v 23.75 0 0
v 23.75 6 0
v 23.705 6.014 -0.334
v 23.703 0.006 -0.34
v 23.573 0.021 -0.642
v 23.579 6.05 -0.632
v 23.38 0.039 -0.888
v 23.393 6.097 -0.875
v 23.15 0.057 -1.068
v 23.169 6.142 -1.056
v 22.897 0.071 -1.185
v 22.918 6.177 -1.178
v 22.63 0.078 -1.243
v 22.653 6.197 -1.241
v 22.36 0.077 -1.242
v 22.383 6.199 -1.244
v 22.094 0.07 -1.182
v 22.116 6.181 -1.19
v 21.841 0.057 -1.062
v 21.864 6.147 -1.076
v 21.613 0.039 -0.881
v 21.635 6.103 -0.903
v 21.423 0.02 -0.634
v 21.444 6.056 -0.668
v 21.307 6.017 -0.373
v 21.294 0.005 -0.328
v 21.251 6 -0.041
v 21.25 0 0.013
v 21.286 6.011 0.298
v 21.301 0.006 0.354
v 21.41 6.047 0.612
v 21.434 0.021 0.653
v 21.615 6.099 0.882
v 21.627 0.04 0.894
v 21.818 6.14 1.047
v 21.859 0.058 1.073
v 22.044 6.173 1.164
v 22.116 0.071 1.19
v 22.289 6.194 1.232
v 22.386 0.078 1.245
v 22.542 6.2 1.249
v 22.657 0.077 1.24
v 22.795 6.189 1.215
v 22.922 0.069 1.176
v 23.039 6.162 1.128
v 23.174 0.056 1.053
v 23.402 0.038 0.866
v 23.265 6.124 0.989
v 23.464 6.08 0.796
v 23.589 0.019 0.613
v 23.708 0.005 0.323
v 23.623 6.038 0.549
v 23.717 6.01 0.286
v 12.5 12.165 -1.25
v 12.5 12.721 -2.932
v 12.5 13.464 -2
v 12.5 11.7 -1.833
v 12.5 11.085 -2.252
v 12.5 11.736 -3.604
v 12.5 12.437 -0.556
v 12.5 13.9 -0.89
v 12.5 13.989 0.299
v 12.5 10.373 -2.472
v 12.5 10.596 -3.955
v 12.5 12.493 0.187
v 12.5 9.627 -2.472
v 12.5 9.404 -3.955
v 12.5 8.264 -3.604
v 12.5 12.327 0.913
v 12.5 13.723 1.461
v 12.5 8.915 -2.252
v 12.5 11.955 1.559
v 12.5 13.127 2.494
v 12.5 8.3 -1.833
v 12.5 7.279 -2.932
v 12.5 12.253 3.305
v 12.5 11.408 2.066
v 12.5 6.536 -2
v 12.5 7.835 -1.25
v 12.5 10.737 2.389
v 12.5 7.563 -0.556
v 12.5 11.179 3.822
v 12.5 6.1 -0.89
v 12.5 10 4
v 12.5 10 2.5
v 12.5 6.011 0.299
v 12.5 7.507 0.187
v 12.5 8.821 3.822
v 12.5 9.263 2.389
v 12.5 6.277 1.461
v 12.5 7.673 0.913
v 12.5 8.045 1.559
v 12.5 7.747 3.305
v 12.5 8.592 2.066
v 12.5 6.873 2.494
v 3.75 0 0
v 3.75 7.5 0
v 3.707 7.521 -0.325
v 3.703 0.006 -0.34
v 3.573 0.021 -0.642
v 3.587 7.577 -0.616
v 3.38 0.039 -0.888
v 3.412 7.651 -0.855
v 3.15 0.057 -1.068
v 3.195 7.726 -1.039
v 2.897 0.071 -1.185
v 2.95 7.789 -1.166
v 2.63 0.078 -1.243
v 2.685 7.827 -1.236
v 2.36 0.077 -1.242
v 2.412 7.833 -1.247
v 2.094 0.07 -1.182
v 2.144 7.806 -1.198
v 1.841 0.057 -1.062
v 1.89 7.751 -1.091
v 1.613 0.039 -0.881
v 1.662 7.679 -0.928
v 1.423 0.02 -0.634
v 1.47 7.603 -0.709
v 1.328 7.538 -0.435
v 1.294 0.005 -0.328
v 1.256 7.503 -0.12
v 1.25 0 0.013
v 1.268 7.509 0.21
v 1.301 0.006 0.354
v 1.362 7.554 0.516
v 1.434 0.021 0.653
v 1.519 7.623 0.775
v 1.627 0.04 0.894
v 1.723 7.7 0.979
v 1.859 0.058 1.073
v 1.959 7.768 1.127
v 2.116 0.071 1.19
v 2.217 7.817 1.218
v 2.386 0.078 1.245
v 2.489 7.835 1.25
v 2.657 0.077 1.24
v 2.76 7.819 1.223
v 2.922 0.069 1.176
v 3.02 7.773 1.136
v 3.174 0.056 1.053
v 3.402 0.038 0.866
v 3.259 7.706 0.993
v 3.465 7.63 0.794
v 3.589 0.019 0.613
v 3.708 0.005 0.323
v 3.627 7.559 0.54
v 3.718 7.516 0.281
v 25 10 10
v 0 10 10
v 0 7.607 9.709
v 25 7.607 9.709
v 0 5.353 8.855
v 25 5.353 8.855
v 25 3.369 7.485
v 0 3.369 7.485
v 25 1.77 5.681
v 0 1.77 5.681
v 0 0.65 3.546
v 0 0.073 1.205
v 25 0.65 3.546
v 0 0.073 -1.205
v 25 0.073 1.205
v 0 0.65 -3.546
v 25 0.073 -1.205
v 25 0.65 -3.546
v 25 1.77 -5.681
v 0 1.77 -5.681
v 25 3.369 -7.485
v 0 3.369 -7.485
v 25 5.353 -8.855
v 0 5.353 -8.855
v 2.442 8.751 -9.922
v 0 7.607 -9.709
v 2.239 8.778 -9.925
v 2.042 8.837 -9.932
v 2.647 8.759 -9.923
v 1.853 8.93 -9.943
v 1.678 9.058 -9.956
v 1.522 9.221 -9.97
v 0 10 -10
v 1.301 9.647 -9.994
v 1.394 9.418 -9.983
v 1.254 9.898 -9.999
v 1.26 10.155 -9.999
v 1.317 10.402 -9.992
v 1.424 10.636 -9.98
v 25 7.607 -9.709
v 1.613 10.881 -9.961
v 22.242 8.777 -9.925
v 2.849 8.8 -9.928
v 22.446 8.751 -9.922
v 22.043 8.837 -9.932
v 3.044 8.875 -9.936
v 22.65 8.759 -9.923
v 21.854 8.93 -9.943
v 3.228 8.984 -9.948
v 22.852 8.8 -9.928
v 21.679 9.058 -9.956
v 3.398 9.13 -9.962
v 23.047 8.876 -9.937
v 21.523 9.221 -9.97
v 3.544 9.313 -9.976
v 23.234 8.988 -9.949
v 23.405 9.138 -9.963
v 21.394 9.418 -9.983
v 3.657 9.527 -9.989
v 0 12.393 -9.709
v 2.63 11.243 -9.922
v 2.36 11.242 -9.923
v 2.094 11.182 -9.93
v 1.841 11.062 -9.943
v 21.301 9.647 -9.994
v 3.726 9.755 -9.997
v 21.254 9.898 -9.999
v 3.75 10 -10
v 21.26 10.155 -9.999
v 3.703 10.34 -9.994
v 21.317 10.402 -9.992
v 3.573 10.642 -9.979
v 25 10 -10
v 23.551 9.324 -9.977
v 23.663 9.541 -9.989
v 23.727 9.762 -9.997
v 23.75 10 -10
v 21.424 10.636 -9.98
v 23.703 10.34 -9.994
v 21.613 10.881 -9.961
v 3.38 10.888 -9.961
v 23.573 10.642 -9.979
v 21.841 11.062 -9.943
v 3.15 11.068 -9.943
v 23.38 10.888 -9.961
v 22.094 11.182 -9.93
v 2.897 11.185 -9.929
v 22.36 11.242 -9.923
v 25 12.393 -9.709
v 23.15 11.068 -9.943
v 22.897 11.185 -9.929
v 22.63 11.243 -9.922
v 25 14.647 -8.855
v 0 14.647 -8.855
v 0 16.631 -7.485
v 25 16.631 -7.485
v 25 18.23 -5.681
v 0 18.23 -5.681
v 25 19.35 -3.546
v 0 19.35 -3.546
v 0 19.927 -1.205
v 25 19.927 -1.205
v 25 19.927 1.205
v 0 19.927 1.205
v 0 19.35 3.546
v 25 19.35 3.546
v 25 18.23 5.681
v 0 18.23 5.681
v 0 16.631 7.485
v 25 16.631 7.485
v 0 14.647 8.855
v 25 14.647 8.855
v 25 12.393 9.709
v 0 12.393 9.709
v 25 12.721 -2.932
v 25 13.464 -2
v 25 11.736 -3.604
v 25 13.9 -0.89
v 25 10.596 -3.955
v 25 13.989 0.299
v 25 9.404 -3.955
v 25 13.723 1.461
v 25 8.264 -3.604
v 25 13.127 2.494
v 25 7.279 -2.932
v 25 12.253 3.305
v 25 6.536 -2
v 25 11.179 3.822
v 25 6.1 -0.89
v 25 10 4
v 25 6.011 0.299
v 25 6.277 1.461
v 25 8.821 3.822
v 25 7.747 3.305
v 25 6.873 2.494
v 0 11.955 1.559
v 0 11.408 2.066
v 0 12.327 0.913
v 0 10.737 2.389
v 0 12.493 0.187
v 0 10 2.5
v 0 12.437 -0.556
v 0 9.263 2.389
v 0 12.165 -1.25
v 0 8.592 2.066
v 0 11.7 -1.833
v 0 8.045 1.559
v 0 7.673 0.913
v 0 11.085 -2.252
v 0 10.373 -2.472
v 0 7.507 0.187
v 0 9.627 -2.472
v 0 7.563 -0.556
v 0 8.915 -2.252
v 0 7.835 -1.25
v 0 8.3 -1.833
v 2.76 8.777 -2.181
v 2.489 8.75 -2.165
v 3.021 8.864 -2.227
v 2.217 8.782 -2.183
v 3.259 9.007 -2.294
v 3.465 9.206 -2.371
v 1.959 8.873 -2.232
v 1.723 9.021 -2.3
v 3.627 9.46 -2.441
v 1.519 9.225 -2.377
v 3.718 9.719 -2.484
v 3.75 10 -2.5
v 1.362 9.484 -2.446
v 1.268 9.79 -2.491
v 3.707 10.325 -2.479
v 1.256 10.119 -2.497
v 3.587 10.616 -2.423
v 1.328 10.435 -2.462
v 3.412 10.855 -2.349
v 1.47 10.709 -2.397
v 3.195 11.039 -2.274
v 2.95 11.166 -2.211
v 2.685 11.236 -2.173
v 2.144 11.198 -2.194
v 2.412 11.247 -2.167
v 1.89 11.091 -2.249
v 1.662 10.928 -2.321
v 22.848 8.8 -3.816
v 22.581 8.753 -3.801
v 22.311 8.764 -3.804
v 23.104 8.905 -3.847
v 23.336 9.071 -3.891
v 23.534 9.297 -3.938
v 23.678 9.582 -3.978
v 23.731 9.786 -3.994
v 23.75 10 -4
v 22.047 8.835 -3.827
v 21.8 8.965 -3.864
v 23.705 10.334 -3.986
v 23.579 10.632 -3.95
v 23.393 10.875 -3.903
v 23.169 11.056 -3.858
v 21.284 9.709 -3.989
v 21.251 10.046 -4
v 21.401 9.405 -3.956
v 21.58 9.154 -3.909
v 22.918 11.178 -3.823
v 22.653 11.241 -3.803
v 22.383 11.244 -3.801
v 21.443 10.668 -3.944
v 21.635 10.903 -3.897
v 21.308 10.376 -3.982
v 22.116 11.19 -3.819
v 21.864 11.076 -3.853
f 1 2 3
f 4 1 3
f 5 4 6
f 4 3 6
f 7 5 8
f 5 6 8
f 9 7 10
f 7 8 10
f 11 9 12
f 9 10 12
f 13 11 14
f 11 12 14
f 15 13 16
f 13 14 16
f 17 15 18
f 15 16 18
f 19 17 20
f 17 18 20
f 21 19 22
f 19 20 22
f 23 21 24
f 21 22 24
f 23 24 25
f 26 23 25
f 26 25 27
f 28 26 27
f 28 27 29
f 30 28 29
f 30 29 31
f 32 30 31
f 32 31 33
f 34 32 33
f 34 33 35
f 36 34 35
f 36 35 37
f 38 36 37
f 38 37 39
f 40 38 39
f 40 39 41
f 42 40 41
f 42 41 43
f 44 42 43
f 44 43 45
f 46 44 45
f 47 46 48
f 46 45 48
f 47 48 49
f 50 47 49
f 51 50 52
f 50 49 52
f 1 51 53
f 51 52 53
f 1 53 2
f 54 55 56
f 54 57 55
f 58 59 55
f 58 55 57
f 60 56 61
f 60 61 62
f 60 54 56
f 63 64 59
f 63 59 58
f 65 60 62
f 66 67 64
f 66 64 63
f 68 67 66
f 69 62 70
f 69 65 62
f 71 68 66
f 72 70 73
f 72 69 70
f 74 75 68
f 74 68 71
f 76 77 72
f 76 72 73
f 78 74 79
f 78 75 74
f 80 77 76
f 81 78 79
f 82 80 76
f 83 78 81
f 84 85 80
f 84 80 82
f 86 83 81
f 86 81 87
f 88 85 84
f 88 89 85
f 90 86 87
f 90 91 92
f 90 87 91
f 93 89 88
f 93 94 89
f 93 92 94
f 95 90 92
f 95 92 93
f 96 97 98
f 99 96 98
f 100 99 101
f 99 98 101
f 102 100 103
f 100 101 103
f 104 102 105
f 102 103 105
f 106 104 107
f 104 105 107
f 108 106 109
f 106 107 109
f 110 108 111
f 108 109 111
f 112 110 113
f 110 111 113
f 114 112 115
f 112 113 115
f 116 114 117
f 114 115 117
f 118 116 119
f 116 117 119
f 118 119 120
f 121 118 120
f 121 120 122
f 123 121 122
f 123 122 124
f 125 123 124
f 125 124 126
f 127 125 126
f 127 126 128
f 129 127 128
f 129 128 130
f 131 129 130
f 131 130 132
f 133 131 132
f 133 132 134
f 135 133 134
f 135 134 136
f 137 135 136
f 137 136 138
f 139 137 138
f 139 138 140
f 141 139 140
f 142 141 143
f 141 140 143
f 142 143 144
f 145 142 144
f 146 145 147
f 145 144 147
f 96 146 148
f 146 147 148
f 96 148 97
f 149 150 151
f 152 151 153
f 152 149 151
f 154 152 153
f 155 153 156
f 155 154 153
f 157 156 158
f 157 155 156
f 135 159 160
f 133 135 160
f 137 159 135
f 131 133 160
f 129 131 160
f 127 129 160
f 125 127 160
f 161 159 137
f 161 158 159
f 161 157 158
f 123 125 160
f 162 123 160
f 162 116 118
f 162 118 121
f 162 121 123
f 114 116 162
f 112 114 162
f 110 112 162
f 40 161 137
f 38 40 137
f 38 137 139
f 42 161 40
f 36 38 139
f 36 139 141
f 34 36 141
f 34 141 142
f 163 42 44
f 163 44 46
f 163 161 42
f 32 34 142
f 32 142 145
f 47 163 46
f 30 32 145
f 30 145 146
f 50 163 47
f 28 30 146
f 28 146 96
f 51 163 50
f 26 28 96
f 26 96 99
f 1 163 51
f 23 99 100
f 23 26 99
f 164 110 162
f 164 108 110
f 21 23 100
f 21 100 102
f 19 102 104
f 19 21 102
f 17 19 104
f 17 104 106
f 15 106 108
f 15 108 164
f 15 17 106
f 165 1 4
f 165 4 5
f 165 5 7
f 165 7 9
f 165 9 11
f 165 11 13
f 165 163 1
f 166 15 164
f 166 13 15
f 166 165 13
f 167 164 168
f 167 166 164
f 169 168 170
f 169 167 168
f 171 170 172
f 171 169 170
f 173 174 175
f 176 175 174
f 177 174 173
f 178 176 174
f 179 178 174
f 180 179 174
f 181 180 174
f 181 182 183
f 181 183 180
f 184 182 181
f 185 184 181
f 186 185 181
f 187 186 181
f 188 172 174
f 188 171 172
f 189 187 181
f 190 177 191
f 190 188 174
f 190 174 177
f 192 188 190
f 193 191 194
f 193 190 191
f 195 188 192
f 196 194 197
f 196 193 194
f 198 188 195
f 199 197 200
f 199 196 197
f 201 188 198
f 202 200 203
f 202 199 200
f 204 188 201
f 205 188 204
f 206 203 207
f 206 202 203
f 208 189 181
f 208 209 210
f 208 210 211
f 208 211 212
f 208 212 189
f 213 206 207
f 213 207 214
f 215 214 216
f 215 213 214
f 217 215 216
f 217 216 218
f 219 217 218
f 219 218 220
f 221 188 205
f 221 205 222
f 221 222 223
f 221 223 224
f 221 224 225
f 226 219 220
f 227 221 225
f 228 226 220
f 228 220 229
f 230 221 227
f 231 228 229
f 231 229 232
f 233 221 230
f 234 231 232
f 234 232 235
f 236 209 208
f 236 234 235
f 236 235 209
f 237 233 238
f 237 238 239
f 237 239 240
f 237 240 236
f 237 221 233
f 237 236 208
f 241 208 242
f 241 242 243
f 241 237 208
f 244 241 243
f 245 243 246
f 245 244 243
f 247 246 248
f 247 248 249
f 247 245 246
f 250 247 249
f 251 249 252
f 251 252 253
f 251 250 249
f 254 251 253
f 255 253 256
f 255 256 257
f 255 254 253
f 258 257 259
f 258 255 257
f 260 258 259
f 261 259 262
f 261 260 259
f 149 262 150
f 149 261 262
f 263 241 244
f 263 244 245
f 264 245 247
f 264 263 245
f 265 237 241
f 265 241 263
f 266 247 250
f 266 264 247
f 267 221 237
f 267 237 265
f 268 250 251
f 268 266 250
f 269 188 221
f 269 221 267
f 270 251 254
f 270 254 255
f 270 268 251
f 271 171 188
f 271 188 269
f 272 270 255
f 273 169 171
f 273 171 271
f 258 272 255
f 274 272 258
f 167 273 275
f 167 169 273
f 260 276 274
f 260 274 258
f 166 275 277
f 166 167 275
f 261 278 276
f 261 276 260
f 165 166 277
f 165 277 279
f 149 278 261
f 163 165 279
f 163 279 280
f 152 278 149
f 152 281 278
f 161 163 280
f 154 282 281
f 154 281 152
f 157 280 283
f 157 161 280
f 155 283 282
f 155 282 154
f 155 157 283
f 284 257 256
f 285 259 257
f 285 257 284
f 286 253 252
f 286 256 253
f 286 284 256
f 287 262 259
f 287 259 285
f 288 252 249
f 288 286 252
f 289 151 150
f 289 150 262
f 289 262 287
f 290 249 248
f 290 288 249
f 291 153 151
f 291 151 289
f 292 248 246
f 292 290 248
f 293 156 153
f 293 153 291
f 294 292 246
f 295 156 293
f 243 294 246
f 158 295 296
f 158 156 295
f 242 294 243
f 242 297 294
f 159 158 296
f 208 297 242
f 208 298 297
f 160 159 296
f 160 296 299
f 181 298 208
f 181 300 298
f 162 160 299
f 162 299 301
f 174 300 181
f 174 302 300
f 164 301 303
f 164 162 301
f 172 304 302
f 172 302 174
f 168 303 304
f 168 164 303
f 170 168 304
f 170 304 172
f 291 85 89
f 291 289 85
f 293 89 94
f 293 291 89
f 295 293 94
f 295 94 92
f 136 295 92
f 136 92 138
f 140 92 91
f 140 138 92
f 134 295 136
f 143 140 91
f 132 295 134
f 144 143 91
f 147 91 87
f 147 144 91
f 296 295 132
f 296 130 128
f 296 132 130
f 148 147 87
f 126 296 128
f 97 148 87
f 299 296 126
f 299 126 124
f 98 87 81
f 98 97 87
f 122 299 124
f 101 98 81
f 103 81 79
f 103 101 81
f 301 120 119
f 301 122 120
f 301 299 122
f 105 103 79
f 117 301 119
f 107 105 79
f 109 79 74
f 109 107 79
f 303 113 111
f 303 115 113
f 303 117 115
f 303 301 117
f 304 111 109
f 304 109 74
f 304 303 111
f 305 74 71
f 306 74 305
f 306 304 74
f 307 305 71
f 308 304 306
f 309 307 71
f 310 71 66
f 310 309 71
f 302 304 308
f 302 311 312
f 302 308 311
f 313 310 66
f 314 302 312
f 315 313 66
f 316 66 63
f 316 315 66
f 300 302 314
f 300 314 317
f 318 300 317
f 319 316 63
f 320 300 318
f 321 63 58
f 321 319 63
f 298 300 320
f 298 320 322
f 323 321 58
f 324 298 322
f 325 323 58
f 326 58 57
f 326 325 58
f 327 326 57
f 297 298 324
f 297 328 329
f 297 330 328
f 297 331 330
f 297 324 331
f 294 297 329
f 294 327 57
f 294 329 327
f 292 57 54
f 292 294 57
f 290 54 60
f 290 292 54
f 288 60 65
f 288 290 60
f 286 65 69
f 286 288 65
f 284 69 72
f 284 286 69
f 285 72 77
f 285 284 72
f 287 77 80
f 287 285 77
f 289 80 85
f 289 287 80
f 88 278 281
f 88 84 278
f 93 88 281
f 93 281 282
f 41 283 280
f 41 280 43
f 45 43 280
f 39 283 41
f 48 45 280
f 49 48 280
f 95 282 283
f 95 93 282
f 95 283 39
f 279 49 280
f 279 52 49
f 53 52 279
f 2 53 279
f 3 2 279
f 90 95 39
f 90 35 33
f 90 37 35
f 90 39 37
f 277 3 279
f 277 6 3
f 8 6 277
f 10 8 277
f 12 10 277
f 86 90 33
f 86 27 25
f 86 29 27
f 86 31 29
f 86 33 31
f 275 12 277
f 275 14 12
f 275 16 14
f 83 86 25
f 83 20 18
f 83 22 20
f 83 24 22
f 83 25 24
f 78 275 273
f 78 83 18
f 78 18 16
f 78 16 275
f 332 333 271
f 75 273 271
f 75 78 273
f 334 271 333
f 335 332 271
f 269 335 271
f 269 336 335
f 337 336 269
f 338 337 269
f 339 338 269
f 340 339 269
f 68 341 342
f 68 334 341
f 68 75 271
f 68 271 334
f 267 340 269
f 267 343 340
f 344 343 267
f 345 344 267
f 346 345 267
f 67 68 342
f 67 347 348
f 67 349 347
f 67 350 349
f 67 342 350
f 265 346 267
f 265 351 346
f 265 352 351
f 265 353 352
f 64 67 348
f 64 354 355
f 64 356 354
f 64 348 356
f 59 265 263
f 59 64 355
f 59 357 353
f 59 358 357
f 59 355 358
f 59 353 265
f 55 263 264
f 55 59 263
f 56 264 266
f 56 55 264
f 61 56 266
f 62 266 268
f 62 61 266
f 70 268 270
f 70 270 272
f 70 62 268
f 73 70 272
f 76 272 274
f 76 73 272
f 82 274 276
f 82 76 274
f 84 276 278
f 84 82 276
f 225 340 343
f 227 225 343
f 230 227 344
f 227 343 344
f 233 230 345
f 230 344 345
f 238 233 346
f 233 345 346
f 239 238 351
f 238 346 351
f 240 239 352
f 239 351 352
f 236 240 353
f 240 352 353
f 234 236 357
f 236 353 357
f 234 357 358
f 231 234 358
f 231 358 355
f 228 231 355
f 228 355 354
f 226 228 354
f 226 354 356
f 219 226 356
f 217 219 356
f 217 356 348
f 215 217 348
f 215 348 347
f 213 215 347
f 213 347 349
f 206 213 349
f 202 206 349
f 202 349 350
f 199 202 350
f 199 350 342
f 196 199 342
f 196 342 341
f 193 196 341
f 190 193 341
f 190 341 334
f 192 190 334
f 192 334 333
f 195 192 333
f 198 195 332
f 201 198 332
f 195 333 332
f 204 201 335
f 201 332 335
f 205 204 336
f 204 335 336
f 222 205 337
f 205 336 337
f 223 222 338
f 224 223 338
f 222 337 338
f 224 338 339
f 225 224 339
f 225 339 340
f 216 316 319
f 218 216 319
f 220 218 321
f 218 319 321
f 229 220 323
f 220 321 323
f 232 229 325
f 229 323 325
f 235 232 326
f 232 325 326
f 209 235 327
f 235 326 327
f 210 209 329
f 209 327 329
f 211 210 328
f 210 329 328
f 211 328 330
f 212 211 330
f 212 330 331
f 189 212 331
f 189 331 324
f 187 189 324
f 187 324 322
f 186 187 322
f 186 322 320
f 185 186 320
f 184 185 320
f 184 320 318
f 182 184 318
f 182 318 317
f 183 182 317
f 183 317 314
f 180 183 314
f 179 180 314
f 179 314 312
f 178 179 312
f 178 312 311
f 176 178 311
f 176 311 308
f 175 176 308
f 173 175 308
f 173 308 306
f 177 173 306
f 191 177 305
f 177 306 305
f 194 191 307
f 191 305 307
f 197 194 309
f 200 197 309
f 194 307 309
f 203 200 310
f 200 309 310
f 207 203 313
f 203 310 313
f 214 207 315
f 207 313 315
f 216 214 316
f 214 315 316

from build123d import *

# Parameters (mm, degrees)
SKETCH2_R          = 1.25
CUT_EXTRUDE1_DEPTH = 10
CIRPATTERN1_COUNT  = 2
CIRPATTERN1_ANGLE  = 270


with BuildPart() as part:
    # Sketch1 → Revolve1 (revolve)
    with BuildSketch(Plane.XY, mode=Mode.PRIVATE) as revolve1_sk:
        Polygon((0, 0), (25, 0), (25, 6), (12.5, 6), (12.5, 7.5), (0, 7.5), align=None)
    revolve(revolve1_sk.sketch.rotate(Axis((0, 10, 0), (1, 0, 0)), 270), axis=Axis((0, 10, 0), (1, 0, 0)))

    # Sketch2 → Cut-Extrude1 (cut)
    with BuildSketch(Plane.XY):
        with Locations((22.5, 10)):
            Circle(SKETCH2_R)
        with Locations((2.5, 10)):
            Circle(SKETCH2_R)
    cut_extrude1 = extrude(amount=-CUT_EXTRUDE1_DEPTH, mode=Mode.SUBTRACT)

    # CirPattern1: Cut-Extrude1 ×2 about axis
    cirpattern1_axis = Axis((0, 10, 0), (1, 0, 0))
    for i in range(1, CIRPATTERN1_COUNT):
        add(cut_extrude1.rotate(cirpattern1_axis, i * CIRPATTERN1_ANGLE / (CIRPATTERN1_COUNT - 1)), mode=Mode.SUBTRACT)


solid = part.part
